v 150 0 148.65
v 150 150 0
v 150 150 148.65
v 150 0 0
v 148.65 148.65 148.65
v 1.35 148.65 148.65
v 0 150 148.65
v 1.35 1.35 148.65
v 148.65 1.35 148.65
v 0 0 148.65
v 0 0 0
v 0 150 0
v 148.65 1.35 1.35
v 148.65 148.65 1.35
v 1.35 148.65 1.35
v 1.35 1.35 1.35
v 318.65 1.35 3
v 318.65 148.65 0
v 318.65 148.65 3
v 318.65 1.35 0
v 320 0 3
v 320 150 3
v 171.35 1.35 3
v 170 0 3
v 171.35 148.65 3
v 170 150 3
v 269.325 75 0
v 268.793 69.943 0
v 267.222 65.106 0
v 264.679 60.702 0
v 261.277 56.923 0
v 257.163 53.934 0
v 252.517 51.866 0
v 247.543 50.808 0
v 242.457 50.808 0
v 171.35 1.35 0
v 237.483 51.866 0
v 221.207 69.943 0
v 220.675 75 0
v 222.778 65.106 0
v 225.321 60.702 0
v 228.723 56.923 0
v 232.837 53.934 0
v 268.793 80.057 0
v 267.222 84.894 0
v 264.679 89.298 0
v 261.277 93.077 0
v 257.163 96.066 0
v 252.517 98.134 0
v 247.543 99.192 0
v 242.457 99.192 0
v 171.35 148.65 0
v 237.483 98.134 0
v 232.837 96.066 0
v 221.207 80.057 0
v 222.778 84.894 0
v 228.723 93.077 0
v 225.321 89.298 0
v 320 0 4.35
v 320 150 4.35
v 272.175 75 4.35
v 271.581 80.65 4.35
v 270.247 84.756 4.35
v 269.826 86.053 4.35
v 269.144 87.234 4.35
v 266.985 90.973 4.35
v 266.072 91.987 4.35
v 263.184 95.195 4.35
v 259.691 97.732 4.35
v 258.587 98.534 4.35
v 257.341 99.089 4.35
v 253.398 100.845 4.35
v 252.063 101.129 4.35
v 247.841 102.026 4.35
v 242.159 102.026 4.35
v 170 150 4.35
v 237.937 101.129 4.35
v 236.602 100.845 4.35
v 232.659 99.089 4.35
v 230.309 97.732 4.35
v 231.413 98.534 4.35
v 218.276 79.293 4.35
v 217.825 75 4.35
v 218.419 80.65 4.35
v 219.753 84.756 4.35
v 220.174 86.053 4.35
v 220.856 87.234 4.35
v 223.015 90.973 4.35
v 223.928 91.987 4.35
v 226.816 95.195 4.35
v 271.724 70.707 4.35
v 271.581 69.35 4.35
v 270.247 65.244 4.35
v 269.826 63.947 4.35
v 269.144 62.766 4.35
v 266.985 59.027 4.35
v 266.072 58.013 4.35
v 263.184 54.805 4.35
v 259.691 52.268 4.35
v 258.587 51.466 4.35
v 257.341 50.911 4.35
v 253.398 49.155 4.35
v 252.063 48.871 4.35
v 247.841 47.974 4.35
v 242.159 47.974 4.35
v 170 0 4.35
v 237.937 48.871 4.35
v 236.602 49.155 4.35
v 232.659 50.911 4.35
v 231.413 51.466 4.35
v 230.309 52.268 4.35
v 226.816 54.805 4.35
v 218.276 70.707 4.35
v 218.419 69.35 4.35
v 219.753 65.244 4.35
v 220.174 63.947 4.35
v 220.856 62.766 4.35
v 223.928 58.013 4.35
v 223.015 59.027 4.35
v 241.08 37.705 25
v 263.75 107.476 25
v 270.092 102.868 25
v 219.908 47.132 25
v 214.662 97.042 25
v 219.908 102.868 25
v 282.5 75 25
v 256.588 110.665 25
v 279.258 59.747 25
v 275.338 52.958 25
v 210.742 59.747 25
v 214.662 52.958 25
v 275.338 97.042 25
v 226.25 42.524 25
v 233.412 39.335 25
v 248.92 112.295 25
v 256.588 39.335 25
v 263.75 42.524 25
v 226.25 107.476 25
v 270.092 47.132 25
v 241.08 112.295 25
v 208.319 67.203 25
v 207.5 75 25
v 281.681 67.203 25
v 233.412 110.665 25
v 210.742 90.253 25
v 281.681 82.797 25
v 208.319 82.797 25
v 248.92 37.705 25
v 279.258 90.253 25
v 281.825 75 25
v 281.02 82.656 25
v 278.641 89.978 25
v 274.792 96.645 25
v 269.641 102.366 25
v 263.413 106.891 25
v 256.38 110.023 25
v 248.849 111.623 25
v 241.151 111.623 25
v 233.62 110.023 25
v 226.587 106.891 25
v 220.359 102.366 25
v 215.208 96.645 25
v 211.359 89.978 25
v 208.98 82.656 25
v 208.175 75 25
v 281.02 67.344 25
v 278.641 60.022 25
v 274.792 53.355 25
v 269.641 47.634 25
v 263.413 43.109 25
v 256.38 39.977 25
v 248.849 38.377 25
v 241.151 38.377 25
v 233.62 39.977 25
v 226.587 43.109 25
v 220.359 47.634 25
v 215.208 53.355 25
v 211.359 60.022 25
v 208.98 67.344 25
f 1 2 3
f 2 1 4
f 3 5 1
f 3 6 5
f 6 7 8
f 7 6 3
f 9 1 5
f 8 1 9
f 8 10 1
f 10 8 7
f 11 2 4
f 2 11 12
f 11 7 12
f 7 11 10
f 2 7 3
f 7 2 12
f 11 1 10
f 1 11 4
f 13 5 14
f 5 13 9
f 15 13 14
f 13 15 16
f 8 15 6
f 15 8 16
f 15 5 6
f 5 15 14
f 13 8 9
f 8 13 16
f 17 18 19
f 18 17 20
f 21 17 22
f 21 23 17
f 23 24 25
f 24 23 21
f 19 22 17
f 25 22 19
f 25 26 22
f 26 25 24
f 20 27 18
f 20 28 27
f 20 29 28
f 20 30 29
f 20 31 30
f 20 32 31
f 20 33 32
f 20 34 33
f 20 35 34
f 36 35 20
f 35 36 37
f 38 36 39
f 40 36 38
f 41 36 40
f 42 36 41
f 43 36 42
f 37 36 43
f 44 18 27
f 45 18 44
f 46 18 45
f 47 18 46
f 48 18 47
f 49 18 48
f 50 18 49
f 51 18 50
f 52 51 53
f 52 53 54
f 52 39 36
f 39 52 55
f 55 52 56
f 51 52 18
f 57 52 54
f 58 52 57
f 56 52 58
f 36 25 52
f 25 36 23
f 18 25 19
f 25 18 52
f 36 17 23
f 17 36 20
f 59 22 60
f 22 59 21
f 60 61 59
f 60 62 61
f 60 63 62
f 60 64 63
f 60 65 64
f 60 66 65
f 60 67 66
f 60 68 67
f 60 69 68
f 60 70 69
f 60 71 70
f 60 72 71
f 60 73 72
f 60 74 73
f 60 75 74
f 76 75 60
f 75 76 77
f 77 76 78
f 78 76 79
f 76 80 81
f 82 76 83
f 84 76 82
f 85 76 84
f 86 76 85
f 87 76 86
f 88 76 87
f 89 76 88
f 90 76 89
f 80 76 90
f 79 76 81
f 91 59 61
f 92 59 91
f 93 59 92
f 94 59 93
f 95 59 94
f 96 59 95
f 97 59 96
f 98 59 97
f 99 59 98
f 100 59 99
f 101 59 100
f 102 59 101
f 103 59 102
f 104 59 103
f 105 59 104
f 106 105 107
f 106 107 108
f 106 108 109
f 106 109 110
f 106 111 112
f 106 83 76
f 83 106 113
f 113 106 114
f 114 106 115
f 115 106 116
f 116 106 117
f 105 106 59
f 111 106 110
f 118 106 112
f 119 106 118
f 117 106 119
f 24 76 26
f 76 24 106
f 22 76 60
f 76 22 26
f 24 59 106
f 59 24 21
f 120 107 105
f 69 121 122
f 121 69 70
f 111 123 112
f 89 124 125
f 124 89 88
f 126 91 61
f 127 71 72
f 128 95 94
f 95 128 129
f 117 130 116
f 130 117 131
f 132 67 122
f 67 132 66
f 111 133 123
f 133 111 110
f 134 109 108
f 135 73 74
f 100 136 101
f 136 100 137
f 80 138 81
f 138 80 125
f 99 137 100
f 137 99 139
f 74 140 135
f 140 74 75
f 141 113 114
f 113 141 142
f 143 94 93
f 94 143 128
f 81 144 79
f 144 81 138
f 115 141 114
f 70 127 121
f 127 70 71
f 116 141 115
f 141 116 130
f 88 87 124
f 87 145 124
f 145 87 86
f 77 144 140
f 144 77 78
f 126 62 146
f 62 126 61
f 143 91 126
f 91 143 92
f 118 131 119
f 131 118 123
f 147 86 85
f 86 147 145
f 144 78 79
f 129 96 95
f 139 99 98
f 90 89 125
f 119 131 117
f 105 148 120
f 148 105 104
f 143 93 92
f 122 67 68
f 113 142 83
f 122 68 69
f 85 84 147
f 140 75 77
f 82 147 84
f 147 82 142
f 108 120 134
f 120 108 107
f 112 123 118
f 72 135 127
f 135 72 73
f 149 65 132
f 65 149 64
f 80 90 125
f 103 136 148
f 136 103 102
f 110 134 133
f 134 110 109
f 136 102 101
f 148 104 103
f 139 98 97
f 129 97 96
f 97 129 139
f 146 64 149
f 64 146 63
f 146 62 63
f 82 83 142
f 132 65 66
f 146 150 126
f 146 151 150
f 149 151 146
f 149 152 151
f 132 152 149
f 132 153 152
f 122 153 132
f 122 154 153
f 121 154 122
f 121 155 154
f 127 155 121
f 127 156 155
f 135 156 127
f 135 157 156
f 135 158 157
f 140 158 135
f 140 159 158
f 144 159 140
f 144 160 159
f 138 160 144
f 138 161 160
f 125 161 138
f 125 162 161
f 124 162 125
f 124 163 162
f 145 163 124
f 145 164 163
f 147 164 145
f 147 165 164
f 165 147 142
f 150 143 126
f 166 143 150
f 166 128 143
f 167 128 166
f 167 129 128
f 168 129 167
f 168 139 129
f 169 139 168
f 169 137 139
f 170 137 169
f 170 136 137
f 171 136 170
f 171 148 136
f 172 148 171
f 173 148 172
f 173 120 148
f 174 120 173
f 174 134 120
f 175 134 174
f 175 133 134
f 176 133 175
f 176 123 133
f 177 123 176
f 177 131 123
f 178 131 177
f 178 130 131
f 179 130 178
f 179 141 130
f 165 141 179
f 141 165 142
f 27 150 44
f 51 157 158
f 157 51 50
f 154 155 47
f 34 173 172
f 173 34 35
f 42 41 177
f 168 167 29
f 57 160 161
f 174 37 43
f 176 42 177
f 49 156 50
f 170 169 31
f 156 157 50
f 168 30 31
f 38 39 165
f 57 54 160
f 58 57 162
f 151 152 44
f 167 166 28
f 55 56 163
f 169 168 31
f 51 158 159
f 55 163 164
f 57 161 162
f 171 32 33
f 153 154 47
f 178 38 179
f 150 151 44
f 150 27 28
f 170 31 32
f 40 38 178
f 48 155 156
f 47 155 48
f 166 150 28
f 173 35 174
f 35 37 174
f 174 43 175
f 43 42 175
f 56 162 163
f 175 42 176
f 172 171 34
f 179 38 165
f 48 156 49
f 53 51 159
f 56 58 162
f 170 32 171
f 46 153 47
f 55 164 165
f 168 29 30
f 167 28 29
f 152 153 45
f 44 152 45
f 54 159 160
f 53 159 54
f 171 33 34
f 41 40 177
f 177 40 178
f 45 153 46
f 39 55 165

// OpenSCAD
boxsize = 150;
wallthickness = .45*3;
capdepth=3;

innerbox = boxsize - wallthickness*2;
hole=boxsize/3;
opening=hole*1.5;
openheight=hole/2;

difference() {
    cube([boxsize,boxsize,boxsize-wallthickness]);
    translate([wallthickness,wallthickness,wallthickness])
        cube([innerbox,innerbox,innerbox+wallthickness]);
}

translate([boxsize+20,0,0]) {
    difference() {
        union() {
            translate([wallthickness,wallthickness,0])
                cube([innerbox,innerbox,capdepth]);
            translate([0,0,capdepth])
                cube([boxsize,boxsize,wallthickness]);
        }
        translate([boxsize/2,boxsize/2,0])
            cylinder(openheight,d1=hole,d2=opening);
    }
    difference() {
        translate([boxsize/2,boxsize/2,0])
            cylinder(openheight,d1=hole,d2=opening);
        translate([boxsize/2,boxsize/2,0])
            cylinder(openheight,d1=hole-wallthickness,d2=opening-wallthickness);
    }
}
